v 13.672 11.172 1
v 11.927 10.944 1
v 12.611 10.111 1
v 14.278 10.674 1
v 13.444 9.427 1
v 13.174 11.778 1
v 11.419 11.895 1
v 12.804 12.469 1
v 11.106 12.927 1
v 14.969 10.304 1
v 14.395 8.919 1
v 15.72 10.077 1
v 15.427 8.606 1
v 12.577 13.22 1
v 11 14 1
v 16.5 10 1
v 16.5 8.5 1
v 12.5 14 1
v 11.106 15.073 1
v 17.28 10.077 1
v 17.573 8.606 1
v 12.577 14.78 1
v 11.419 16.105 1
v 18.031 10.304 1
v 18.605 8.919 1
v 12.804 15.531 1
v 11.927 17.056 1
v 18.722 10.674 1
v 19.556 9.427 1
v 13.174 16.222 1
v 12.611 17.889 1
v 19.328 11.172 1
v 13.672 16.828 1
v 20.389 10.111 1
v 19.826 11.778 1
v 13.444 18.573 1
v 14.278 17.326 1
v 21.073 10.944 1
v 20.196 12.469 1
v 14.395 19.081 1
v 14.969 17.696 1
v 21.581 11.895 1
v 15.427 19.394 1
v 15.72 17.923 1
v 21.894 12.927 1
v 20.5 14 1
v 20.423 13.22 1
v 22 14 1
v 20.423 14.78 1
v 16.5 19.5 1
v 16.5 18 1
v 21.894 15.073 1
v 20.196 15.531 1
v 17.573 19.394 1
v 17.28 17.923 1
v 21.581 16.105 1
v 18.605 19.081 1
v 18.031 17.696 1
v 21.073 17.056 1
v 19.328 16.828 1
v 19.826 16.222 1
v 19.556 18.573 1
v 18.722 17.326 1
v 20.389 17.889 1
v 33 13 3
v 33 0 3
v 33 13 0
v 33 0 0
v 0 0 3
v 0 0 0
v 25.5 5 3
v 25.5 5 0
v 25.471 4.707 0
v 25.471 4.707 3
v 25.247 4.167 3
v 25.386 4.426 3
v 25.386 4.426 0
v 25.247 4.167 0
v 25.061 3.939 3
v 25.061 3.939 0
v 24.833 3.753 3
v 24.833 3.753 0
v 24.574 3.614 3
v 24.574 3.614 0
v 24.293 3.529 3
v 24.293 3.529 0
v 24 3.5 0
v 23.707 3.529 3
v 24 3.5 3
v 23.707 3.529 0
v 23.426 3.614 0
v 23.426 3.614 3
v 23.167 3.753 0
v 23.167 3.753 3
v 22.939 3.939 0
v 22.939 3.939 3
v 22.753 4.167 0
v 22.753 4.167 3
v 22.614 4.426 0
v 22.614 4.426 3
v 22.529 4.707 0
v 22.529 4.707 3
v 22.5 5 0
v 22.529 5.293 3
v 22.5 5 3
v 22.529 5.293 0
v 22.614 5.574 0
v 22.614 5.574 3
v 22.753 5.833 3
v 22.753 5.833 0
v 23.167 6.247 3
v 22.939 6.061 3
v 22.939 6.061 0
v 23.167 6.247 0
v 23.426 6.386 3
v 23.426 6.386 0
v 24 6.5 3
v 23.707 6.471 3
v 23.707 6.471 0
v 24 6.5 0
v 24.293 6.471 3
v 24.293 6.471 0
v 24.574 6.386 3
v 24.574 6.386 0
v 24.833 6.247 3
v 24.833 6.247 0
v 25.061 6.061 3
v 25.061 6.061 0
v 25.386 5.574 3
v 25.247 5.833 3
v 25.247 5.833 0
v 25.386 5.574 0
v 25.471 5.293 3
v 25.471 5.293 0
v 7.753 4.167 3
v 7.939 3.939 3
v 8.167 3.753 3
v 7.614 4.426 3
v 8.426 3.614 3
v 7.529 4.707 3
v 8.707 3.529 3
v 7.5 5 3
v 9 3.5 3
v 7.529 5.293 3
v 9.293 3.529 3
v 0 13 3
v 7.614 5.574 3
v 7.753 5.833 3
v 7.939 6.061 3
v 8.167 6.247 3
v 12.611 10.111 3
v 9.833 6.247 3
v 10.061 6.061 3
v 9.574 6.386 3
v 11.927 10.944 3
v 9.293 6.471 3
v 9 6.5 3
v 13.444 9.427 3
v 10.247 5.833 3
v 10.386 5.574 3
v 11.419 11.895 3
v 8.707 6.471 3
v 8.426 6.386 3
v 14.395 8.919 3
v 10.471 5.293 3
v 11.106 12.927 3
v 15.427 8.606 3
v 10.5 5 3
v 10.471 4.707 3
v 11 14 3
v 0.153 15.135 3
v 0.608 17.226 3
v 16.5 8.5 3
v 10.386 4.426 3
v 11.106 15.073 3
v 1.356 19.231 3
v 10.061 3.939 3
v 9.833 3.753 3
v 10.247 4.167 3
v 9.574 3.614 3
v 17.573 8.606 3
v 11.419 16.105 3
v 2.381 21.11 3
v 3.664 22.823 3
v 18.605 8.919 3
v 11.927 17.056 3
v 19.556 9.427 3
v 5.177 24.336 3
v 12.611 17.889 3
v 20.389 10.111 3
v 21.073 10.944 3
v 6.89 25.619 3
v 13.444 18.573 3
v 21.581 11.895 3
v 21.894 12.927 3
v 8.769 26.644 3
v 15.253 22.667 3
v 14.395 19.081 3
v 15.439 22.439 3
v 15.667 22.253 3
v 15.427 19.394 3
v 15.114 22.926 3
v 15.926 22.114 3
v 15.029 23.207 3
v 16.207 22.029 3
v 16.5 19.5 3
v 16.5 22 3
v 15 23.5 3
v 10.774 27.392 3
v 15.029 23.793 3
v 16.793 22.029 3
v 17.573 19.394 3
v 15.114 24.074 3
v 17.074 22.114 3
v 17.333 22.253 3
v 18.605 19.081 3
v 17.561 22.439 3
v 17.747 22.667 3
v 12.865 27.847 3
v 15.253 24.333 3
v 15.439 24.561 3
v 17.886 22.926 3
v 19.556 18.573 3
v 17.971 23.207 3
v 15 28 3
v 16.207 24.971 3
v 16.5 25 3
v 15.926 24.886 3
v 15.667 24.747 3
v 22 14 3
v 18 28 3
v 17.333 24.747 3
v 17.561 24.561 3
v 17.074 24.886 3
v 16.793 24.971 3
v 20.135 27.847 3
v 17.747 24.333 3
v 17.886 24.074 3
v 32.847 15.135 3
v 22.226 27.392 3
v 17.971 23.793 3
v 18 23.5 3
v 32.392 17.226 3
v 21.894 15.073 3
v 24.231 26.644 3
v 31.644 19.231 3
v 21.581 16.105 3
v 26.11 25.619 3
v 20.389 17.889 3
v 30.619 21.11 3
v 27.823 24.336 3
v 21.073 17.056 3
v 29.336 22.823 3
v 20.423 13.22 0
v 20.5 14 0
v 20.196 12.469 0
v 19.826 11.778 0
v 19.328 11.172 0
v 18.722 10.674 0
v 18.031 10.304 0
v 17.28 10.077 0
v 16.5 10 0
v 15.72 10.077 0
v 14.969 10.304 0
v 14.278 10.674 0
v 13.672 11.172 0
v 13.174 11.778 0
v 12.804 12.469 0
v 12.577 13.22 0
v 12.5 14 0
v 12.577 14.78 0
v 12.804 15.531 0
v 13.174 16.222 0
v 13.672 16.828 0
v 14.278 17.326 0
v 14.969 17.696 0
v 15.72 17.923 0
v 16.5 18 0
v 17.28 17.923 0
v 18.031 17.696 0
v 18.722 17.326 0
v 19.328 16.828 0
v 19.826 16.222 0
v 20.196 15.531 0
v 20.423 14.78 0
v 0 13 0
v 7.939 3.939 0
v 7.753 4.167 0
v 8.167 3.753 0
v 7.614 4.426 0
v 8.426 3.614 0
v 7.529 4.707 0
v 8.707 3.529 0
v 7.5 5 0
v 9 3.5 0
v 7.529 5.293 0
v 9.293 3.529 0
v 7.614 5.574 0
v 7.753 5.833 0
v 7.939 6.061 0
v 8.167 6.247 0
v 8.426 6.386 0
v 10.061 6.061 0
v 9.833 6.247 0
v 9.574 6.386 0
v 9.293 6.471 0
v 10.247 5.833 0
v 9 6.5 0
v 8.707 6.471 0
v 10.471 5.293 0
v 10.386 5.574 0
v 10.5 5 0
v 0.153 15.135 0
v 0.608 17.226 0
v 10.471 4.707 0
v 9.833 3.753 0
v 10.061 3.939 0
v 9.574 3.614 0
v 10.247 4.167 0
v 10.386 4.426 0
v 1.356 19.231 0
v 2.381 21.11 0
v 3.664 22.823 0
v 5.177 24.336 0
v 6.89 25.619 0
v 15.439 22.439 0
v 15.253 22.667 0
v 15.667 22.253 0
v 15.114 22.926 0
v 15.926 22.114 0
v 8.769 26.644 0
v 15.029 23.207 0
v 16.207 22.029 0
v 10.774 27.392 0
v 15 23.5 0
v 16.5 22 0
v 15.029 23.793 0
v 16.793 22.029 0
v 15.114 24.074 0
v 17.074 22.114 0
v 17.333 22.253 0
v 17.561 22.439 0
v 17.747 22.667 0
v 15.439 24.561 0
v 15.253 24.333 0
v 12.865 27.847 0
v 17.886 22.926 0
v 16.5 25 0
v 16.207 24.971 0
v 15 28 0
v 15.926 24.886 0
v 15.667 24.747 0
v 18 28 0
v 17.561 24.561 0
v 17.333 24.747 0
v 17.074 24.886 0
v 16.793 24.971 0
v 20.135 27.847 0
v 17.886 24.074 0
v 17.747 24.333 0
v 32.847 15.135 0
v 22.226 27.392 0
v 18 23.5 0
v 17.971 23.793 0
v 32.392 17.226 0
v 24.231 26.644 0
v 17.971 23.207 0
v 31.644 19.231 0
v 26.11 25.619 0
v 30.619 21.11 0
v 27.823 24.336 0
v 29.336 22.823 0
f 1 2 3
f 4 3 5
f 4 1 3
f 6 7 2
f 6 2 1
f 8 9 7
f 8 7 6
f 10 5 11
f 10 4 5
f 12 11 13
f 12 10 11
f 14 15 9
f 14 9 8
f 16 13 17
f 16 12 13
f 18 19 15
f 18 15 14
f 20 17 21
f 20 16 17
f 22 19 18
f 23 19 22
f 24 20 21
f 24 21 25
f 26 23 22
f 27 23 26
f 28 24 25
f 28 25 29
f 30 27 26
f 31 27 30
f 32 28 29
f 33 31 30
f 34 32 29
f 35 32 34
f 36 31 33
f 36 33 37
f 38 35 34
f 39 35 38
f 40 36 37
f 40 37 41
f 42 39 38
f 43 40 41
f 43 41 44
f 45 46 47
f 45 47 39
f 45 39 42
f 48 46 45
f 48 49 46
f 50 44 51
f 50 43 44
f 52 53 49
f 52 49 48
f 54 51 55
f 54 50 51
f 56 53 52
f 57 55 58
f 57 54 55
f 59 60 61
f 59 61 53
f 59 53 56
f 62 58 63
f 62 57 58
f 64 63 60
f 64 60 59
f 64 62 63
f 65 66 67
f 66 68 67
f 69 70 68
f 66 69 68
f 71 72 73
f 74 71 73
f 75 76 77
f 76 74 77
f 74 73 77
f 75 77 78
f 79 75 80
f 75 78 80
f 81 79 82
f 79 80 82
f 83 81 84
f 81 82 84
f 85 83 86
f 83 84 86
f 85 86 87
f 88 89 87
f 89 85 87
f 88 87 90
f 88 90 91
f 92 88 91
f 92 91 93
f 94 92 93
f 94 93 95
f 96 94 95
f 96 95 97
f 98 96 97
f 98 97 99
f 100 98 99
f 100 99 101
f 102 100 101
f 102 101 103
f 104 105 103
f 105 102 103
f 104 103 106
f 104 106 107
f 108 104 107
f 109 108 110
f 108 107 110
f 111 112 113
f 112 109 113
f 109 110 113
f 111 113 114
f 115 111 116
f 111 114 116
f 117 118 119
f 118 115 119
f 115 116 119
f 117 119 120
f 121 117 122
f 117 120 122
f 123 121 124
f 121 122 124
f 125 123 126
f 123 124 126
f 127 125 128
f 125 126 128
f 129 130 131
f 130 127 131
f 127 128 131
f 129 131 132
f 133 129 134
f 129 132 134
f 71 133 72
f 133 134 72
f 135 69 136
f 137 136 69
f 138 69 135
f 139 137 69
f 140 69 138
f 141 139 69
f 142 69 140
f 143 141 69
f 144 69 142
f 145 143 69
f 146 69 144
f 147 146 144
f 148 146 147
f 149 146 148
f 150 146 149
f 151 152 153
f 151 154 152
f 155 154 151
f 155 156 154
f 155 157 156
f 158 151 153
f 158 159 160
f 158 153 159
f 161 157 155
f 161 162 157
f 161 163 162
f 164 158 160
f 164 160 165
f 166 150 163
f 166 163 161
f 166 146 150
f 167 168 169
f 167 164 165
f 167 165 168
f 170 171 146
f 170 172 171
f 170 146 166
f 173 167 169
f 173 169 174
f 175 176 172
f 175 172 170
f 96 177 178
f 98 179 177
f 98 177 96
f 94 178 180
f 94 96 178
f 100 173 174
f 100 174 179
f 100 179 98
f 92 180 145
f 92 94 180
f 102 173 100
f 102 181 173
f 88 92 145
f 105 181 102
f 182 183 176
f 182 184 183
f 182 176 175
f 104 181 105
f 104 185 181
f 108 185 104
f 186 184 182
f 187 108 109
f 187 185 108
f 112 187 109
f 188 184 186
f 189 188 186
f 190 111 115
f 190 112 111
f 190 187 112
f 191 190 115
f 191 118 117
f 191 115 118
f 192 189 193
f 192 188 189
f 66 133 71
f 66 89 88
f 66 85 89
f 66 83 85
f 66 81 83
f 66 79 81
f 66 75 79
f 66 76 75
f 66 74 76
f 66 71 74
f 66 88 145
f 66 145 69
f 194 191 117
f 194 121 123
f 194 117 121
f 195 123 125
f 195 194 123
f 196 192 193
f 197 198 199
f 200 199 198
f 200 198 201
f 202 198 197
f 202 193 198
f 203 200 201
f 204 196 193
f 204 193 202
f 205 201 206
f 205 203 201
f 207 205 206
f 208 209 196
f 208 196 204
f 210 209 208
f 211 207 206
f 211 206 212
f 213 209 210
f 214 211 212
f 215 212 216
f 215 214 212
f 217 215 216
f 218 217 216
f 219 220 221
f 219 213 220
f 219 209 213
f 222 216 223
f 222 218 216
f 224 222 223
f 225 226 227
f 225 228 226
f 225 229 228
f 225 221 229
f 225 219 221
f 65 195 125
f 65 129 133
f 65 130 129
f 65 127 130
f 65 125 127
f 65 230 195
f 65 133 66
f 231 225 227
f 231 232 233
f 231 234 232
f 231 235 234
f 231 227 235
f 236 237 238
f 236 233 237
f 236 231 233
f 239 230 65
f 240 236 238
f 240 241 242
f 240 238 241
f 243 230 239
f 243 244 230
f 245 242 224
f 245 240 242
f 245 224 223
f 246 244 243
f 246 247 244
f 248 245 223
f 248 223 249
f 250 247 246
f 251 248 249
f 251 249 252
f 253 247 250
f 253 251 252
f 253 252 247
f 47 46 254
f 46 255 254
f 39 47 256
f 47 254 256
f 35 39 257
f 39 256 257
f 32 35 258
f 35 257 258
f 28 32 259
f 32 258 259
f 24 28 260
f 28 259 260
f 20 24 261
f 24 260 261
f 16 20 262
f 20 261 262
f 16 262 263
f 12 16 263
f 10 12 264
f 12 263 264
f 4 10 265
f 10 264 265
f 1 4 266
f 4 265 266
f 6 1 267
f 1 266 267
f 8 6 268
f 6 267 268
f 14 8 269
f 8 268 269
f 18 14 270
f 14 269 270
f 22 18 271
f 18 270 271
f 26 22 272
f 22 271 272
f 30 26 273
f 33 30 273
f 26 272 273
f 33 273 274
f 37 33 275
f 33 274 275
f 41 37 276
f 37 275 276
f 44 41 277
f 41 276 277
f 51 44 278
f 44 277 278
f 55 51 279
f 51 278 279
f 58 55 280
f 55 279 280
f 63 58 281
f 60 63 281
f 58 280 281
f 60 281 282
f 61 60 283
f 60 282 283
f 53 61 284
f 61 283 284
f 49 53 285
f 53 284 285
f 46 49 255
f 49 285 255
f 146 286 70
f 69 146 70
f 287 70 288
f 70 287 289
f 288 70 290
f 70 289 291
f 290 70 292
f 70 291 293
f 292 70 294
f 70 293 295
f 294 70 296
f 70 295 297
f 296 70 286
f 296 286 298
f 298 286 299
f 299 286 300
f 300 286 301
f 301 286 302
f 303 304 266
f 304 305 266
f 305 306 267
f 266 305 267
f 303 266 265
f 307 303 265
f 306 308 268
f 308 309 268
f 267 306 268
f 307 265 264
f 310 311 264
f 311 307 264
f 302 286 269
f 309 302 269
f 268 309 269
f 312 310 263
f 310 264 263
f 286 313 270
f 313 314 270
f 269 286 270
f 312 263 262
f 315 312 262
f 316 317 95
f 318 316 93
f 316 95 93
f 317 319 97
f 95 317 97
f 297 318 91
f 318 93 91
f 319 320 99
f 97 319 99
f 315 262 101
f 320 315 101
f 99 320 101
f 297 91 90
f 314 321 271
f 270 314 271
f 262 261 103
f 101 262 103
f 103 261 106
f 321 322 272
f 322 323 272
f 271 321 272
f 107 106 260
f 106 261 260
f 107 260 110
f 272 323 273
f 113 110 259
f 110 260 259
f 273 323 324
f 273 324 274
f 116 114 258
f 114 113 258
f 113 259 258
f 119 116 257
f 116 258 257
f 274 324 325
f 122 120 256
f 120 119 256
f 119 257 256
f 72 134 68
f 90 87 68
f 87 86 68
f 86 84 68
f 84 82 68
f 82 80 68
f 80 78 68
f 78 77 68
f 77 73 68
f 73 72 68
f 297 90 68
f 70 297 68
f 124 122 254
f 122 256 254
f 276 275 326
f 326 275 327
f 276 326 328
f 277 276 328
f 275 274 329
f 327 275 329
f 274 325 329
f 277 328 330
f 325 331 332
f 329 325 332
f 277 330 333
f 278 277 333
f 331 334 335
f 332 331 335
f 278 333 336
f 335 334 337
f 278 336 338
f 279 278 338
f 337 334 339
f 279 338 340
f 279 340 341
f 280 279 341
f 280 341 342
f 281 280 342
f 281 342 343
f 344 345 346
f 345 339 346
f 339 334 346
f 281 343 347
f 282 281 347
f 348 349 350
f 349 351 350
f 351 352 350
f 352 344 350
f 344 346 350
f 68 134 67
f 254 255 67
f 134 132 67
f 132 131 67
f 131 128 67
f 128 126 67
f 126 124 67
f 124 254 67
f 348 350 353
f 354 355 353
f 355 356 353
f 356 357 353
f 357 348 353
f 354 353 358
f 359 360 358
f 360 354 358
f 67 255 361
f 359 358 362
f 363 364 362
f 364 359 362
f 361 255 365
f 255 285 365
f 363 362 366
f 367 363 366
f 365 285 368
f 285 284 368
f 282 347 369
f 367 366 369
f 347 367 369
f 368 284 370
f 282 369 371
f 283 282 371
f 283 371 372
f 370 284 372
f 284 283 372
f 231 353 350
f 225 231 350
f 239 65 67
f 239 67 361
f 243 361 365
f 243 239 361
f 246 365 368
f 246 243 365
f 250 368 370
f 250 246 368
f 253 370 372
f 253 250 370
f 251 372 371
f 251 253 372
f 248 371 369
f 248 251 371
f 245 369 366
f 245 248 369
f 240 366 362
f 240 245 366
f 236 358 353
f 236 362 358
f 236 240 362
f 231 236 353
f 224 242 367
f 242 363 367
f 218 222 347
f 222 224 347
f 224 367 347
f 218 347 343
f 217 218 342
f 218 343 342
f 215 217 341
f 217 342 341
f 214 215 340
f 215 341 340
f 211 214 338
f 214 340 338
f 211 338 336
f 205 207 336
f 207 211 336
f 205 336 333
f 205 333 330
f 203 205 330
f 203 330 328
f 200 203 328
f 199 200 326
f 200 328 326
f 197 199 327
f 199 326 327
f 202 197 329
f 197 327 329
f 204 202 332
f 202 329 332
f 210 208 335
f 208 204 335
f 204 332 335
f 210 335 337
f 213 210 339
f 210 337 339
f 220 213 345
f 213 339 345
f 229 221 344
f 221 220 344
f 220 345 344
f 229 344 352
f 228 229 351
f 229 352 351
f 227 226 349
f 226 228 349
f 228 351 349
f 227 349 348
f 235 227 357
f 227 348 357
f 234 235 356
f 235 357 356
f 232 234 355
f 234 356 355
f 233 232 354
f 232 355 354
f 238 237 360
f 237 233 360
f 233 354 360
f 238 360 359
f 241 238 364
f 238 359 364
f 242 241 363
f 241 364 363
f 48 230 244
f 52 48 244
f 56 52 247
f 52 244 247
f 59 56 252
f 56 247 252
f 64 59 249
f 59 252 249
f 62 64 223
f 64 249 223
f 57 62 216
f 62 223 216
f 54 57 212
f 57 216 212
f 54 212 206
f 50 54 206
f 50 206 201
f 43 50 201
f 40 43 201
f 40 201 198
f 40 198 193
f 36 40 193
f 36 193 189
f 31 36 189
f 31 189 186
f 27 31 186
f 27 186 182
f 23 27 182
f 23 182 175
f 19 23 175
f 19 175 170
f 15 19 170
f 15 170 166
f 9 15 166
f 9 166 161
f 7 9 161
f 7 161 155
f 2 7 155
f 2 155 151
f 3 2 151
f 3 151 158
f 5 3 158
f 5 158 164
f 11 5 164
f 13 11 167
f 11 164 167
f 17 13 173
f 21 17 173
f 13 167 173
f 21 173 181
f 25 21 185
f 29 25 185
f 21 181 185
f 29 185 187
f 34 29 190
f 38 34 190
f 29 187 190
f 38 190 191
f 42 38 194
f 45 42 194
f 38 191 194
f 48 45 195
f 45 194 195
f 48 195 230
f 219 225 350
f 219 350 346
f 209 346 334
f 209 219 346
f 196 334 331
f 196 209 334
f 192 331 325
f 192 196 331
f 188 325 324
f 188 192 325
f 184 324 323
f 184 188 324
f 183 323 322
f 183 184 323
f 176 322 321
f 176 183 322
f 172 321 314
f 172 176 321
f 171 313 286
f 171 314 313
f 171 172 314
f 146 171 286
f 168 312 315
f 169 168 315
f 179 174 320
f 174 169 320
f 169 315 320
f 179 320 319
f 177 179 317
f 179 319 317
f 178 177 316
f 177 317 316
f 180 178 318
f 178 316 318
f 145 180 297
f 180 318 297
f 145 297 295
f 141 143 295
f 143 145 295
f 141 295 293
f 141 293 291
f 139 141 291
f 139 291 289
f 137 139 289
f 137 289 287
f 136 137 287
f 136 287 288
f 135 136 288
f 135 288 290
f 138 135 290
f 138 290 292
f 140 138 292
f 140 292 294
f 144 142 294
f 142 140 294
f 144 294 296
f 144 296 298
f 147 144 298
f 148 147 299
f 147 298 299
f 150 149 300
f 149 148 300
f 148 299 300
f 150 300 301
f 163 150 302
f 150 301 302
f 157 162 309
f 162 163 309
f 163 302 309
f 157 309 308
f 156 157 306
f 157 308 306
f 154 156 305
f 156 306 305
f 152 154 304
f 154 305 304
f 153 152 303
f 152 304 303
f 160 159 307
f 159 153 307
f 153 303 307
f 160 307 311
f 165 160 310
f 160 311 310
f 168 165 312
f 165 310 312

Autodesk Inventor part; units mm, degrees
ref_plane "YZ Plane" through (0, 0, 0) normal (1, 0, 0) x (0, 1, 0)
ref_plane "XZ Plane" through (0, 0, 0) normal (0, 1, 0) x (-1, 0, 0)
ref_plane "XY Plane" through (0, 0, 0) normal (0, 0, 1) x (1, 0, 0)
sketch "Sketch1" plane through (0, 0, 0) normal (0, 0, 1) x (1, 0, 0)
  line L0 (0, 0) -> (33, 0)
  line L1 (33, 0) -> (33, 28)
  line L2 (33, 28) -> (0, 28)
  line L3 (0, 28) -> (0, 0)
  circle A0 centre (16.5, 14) radius 4
  circle A1 centre (16.5, 23.5) radius 1.5
  circle A2 centre (9, 5) radius 1.5
  circle A3 centre (24, 5) radius 1.5
  dimension "d0" = 33
  dimension "d1" = 28
  dimension "d2" = 8
  dimension "d3" = 14
  dimension "d4" = 16.5
  dimension "d5" = 3
  dimension "d6" = 3
  dimension "d7" = 3
  dimension "d8" = 4.5
  dimension "d9" = 0
  dimension "d10" = 15
  dimension "d11" = 5
  dimension "d12" = 9
  dimension "d13" = 5
extrude "Extrusion1" add sketch "Sketch1" along normal blind 3
sketch "Sketch2" plane through (0, 0, 3) normal (0, 0, 1) x (1, 0, 0)
  circle A0 centre (16.5, 14) radius 4 projected
  circle A1 centre (16.5, 14) radius 5.5
  point P0 (0, 0)
  dimension "d16" = 11
extrude "Extrusion2" cut sketch "Sketch2" against normal blind 2 contours A0 | A1
fillet "Fillet1" radius 15 2 edges at (33, 28, 1.5) (0, 28, 1.5)
equation "\"d3\" = 0.5 * d1"
equation "\"d4\" = 0.5 * d0"
properties part number "Arm6" material "Aluminum 6061, Welded"
